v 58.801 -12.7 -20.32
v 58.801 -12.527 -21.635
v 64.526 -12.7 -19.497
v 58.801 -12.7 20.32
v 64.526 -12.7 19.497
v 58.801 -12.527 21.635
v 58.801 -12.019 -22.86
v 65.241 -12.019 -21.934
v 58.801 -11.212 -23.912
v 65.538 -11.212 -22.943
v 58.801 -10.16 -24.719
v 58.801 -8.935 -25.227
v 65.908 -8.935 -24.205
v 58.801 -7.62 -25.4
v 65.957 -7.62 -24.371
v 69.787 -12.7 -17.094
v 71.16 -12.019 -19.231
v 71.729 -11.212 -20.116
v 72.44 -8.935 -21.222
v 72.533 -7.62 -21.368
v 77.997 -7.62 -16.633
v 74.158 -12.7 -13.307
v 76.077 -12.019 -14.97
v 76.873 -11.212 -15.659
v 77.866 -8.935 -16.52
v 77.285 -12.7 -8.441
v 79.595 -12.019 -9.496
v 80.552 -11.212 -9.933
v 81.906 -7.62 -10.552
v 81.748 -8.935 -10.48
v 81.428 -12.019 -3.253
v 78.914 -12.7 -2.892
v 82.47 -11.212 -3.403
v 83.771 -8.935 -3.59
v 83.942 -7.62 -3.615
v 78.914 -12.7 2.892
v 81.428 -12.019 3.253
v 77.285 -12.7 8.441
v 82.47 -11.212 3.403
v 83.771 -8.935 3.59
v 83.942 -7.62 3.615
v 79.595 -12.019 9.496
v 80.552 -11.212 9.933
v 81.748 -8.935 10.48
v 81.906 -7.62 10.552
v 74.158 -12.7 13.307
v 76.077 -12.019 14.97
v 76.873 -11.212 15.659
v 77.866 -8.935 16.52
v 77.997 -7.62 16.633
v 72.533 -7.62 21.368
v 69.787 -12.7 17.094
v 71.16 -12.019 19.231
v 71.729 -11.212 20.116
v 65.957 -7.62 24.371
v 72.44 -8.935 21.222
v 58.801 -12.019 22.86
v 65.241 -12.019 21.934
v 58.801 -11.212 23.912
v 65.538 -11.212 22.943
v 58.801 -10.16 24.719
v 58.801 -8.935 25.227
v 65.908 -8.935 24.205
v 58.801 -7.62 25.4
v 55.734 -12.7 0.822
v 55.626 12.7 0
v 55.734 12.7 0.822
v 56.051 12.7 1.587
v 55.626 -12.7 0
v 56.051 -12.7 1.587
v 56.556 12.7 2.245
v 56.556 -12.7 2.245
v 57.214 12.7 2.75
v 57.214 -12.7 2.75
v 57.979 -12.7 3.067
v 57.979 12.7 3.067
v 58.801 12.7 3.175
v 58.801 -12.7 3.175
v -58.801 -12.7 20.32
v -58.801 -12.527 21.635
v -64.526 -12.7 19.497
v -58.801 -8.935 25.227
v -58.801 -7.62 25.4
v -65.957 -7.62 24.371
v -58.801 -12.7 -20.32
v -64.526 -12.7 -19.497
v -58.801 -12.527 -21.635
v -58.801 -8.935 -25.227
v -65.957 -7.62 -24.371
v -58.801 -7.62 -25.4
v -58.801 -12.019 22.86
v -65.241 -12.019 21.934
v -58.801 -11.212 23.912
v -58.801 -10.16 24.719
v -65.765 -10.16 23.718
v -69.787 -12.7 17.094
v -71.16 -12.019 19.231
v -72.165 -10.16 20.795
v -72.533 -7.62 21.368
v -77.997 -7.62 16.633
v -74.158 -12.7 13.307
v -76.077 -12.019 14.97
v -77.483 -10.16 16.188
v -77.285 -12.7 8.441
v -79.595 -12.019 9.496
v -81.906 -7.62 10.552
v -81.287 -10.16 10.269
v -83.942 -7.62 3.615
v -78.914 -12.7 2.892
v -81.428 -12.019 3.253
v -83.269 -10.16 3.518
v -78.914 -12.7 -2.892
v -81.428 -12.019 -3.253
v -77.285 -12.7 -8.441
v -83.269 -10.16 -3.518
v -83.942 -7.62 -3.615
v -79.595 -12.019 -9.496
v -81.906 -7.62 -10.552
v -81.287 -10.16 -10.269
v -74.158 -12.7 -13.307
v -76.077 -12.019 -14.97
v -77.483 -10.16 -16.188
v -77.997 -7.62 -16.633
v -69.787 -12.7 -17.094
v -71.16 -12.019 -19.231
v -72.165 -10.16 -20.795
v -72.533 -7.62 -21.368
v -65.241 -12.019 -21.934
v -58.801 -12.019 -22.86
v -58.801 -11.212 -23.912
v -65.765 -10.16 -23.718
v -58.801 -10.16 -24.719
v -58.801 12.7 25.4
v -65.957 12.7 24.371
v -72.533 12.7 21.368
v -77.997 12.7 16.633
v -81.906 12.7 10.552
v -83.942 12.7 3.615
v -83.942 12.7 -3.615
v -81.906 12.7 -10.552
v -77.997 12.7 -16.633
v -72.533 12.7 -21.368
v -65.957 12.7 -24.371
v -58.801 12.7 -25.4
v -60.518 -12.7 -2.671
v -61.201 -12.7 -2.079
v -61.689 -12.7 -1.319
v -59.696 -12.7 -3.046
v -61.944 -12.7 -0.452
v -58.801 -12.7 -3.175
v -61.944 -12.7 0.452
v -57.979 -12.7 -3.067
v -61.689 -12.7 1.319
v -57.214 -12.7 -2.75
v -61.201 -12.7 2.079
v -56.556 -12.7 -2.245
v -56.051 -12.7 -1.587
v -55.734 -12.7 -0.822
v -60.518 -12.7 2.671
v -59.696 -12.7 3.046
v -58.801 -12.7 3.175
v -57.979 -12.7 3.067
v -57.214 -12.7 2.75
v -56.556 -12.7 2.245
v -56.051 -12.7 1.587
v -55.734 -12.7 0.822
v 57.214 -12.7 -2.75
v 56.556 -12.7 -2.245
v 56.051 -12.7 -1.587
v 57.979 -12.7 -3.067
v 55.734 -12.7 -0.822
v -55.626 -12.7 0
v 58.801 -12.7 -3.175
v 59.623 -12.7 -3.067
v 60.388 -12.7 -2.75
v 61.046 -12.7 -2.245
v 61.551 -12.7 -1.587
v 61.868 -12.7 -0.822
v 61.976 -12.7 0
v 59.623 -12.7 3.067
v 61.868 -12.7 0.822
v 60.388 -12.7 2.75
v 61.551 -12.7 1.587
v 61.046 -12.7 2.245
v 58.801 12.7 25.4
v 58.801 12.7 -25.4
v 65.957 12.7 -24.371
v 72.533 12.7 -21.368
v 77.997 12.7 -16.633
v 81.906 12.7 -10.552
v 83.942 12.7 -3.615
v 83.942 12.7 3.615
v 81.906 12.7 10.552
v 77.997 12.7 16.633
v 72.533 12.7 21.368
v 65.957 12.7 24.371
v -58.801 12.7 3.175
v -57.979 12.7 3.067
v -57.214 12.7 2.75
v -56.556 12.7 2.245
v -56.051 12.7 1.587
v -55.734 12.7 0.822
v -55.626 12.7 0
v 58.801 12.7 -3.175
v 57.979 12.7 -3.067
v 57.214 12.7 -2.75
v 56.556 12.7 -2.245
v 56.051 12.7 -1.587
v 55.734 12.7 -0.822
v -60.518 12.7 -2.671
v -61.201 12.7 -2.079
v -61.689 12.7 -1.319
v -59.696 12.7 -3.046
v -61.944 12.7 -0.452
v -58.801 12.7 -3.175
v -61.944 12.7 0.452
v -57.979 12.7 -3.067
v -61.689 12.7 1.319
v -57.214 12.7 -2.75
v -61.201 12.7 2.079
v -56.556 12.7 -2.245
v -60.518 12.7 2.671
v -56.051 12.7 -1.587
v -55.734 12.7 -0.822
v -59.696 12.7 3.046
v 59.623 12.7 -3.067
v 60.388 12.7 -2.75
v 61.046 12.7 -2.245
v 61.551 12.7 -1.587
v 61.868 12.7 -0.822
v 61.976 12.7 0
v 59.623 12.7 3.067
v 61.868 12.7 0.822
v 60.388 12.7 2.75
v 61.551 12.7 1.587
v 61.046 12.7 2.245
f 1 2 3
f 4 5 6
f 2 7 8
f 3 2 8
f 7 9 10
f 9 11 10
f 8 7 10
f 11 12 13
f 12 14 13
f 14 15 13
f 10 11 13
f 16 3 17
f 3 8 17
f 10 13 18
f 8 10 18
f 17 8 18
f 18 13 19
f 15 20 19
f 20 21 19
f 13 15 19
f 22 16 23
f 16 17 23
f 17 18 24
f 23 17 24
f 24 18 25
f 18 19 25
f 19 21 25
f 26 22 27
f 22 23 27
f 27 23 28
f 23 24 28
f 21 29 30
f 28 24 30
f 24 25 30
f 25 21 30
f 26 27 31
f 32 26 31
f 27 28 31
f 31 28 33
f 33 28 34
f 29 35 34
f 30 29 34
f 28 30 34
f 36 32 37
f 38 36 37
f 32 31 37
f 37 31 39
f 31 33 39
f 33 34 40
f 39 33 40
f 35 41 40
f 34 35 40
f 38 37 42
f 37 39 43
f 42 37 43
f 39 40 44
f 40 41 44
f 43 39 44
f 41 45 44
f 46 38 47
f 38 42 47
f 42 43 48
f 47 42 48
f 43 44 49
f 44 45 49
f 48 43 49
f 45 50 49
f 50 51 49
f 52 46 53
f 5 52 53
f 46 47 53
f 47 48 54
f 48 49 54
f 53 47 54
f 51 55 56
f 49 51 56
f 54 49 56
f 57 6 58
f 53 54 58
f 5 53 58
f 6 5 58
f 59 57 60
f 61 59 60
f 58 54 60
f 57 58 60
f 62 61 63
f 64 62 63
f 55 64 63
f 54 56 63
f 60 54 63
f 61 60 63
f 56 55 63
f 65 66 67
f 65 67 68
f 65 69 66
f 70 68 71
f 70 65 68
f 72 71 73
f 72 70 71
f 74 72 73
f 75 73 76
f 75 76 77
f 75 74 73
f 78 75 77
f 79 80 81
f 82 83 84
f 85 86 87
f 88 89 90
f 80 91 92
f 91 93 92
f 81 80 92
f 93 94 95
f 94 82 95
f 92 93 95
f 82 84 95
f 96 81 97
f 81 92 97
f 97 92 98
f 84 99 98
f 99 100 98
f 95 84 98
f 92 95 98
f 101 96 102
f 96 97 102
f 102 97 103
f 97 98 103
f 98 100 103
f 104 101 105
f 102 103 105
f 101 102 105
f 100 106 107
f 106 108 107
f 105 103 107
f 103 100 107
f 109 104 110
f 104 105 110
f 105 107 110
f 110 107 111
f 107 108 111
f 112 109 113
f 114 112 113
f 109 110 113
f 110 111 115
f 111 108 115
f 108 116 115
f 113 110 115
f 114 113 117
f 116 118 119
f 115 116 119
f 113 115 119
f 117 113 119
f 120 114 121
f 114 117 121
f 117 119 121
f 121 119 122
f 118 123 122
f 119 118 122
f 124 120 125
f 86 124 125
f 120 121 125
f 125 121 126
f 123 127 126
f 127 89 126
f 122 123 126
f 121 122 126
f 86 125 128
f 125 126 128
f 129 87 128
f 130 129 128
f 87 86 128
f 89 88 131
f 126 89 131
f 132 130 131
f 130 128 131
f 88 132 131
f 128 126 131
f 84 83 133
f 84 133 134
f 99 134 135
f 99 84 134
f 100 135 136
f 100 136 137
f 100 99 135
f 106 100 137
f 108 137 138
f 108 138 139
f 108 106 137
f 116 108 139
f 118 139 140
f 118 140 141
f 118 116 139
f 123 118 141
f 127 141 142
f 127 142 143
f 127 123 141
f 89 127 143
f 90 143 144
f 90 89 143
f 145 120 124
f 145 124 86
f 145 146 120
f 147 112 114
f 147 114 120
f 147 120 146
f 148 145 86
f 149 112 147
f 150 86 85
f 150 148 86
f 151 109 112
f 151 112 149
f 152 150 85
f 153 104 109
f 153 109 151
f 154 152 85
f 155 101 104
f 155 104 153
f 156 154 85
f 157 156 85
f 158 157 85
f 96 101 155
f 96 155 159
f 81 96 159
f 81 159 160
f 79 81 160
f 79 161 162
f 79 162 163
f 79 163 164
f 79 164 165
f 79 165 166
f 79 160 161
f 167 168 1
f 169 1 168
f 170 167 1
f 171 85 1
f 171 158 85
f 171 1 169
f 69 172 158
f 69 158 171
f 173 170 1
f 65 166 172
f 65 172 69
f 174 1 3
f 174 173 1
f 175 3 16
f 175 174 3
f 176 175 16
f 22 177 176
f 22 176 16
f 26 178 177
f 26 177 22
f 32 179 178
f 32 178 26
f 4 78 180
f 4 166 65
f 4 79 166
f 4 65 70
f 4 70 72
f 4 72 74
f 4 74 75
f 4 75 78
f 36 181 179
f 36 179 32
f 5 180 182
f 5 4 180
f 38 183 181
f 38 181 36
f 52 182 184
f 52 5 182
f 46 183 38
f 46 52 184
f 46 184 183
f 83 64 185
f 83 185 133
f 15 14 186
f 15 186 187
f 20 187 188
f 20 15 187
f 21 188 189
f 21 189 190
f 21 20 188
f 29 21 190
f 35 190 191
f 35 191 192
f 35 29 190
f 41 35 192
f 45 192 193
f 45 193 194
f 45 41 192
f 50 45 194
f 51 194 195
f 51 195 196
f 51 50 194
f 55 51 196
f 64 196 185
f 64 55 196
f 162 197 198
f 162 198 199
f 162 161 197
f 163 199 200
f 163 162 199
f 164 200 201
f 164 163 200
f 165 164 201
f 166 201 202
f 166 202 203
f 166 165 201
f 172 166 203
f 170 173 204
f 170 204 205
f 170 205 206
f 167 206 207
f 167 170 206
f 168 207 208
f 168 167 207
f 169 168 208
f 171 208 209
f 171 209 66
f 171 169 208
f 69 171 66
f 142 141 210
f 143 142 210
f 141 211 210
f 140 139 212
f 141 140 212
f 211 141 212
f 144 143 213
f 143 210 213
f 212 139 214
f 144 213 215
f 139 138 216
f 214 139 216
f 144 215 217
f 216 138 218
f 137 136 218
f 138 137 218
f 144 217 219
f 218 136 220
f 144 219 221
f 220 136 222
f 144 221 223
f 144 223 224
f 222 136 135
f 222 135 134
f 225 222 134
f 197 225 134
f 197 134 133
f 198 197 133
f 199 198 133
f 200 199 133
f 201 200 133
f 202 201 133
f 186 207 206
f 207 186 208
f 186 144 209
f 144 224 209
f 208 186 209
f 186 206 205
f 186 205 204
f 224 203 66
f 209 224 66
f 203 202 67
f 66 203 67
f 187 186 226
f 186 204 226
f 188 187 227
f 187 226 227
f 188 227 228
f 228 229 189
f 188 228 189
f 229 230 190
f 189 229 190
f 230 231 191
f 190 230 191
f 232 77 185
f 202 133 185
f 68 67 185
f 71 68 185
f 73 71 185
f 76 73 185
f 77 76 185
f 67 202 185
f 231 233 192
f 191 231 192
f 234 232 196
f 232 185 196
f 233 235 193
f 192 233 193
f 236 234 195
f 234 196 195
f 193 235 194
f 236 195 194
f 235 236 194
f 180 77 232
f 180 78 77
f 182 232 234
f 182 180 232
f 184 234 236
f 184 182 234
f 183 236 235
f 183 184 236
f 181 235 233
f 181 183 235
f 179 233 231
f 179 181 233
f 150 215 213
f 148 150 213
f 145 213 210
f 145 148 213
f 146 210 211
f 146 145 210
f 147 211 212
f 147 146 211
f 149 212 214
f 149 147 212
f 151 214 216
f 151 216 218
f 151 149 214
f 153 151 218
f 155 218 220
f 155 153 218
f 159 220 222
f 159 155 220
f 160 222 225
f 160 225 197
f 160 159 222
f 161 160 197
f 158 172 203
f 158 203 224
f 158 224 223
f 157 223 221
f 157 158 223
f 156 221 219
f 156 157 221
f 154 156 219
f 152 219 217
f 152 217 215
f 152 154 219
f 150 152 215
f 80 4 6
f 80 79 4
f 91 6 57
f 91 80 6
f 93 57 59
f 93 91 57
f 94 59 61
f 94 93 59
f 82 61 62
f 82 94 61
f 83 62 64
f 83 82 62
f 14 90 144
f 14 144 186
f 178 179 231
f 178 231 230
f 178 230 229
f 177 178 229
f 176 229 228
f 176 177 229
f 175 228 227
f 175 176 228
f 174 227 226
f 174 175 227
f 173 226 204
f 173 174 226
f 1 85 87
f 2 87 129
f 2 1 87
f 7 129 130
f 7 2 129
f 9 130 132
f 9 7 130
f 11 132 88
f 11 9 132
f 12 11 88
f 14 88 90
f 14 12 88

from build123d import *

# Parameters (mm, degrees)
F1_DEPTH = 12.7
F2_R     = 5.08


with BuildPart() as f1:
    # F0 (on Front) → F1 (new body, symmetric)
    with BuildSketch(Plane.XZ):
        with BuildLine():
            Line((58.801, 25.4), (58.801, 3.175))
            ThreePointArc((58.801, 3.175), (61.046064, 2.245064), (61.976, 0))
            ThreePointArc((61.976, 0), (61.046064, -2.245064), (58.801, -3.175))
            Line((58.801, -3.175), (58.801, -25.4))
            ThreePointArc((58.801, -25.4), (84.201, 0), (58.801, 25.4))
        make_face()
        with BuildLine():
            Line((-55.626, 0), (0, 0))
            Line((0, 0), (55.626, 0))
            ThreePointArc((55.626, 0), (56.555936, 2.245064), (58.801, 3.175))
            Line((58.801, 3.175), (58.801, 25.4))
            Line((58.801, 25.4), (-58.801, 25.4))
            Line((-58.801, 25.4), (-58.801, 3.175))
            ThreePointArc((-58.801, 3.175), (-56.555936, 2.245064), (-55.626, 0))
        make_face()
        with BuildLine():
            Line((55.626, 0), (0, 0))
            Line((0, 0), (-55.626, 0))
            ThreePointArc((-55.626, 0), (-56.555936, -2.245064), (-58.801, -3.175))
            Line((-58.801, -3.175), (-58.801, -25.4))
            Line((-58.801, -25.4), (58.801, -25.4))
            Line((58.801, -25.4), (58.801, -3.175))
            ThreePointArc((58.801, -3.175), (56.555936, -2.245064), (55.626, 0))
        make_face()
        with BuildLine():
            ThreePointArc((-58.801, -3.175), (-61.976, 0), (-58.801, 3.175))
            Line((-58.801, 3.175), (-58.801, 25.4))
            ThreePointArc((-58.801, 25.4), (-84.201, 0), (-58.801, -25.4))
            Line((-58.801, -25.4), (-58.801, -3.175))
        make_face()
    extrude(amount=F1_DEPTH, both=True)

    # F2
    f2_edges = [f1.edges().sort_by_distance(p)[0] for p in [
        (-84.201, -12.7, 0),
        (0, -12.7, 25.4),
    ]]
    fillet(f2_edges, radius=F2_R)


solid = f1.part
